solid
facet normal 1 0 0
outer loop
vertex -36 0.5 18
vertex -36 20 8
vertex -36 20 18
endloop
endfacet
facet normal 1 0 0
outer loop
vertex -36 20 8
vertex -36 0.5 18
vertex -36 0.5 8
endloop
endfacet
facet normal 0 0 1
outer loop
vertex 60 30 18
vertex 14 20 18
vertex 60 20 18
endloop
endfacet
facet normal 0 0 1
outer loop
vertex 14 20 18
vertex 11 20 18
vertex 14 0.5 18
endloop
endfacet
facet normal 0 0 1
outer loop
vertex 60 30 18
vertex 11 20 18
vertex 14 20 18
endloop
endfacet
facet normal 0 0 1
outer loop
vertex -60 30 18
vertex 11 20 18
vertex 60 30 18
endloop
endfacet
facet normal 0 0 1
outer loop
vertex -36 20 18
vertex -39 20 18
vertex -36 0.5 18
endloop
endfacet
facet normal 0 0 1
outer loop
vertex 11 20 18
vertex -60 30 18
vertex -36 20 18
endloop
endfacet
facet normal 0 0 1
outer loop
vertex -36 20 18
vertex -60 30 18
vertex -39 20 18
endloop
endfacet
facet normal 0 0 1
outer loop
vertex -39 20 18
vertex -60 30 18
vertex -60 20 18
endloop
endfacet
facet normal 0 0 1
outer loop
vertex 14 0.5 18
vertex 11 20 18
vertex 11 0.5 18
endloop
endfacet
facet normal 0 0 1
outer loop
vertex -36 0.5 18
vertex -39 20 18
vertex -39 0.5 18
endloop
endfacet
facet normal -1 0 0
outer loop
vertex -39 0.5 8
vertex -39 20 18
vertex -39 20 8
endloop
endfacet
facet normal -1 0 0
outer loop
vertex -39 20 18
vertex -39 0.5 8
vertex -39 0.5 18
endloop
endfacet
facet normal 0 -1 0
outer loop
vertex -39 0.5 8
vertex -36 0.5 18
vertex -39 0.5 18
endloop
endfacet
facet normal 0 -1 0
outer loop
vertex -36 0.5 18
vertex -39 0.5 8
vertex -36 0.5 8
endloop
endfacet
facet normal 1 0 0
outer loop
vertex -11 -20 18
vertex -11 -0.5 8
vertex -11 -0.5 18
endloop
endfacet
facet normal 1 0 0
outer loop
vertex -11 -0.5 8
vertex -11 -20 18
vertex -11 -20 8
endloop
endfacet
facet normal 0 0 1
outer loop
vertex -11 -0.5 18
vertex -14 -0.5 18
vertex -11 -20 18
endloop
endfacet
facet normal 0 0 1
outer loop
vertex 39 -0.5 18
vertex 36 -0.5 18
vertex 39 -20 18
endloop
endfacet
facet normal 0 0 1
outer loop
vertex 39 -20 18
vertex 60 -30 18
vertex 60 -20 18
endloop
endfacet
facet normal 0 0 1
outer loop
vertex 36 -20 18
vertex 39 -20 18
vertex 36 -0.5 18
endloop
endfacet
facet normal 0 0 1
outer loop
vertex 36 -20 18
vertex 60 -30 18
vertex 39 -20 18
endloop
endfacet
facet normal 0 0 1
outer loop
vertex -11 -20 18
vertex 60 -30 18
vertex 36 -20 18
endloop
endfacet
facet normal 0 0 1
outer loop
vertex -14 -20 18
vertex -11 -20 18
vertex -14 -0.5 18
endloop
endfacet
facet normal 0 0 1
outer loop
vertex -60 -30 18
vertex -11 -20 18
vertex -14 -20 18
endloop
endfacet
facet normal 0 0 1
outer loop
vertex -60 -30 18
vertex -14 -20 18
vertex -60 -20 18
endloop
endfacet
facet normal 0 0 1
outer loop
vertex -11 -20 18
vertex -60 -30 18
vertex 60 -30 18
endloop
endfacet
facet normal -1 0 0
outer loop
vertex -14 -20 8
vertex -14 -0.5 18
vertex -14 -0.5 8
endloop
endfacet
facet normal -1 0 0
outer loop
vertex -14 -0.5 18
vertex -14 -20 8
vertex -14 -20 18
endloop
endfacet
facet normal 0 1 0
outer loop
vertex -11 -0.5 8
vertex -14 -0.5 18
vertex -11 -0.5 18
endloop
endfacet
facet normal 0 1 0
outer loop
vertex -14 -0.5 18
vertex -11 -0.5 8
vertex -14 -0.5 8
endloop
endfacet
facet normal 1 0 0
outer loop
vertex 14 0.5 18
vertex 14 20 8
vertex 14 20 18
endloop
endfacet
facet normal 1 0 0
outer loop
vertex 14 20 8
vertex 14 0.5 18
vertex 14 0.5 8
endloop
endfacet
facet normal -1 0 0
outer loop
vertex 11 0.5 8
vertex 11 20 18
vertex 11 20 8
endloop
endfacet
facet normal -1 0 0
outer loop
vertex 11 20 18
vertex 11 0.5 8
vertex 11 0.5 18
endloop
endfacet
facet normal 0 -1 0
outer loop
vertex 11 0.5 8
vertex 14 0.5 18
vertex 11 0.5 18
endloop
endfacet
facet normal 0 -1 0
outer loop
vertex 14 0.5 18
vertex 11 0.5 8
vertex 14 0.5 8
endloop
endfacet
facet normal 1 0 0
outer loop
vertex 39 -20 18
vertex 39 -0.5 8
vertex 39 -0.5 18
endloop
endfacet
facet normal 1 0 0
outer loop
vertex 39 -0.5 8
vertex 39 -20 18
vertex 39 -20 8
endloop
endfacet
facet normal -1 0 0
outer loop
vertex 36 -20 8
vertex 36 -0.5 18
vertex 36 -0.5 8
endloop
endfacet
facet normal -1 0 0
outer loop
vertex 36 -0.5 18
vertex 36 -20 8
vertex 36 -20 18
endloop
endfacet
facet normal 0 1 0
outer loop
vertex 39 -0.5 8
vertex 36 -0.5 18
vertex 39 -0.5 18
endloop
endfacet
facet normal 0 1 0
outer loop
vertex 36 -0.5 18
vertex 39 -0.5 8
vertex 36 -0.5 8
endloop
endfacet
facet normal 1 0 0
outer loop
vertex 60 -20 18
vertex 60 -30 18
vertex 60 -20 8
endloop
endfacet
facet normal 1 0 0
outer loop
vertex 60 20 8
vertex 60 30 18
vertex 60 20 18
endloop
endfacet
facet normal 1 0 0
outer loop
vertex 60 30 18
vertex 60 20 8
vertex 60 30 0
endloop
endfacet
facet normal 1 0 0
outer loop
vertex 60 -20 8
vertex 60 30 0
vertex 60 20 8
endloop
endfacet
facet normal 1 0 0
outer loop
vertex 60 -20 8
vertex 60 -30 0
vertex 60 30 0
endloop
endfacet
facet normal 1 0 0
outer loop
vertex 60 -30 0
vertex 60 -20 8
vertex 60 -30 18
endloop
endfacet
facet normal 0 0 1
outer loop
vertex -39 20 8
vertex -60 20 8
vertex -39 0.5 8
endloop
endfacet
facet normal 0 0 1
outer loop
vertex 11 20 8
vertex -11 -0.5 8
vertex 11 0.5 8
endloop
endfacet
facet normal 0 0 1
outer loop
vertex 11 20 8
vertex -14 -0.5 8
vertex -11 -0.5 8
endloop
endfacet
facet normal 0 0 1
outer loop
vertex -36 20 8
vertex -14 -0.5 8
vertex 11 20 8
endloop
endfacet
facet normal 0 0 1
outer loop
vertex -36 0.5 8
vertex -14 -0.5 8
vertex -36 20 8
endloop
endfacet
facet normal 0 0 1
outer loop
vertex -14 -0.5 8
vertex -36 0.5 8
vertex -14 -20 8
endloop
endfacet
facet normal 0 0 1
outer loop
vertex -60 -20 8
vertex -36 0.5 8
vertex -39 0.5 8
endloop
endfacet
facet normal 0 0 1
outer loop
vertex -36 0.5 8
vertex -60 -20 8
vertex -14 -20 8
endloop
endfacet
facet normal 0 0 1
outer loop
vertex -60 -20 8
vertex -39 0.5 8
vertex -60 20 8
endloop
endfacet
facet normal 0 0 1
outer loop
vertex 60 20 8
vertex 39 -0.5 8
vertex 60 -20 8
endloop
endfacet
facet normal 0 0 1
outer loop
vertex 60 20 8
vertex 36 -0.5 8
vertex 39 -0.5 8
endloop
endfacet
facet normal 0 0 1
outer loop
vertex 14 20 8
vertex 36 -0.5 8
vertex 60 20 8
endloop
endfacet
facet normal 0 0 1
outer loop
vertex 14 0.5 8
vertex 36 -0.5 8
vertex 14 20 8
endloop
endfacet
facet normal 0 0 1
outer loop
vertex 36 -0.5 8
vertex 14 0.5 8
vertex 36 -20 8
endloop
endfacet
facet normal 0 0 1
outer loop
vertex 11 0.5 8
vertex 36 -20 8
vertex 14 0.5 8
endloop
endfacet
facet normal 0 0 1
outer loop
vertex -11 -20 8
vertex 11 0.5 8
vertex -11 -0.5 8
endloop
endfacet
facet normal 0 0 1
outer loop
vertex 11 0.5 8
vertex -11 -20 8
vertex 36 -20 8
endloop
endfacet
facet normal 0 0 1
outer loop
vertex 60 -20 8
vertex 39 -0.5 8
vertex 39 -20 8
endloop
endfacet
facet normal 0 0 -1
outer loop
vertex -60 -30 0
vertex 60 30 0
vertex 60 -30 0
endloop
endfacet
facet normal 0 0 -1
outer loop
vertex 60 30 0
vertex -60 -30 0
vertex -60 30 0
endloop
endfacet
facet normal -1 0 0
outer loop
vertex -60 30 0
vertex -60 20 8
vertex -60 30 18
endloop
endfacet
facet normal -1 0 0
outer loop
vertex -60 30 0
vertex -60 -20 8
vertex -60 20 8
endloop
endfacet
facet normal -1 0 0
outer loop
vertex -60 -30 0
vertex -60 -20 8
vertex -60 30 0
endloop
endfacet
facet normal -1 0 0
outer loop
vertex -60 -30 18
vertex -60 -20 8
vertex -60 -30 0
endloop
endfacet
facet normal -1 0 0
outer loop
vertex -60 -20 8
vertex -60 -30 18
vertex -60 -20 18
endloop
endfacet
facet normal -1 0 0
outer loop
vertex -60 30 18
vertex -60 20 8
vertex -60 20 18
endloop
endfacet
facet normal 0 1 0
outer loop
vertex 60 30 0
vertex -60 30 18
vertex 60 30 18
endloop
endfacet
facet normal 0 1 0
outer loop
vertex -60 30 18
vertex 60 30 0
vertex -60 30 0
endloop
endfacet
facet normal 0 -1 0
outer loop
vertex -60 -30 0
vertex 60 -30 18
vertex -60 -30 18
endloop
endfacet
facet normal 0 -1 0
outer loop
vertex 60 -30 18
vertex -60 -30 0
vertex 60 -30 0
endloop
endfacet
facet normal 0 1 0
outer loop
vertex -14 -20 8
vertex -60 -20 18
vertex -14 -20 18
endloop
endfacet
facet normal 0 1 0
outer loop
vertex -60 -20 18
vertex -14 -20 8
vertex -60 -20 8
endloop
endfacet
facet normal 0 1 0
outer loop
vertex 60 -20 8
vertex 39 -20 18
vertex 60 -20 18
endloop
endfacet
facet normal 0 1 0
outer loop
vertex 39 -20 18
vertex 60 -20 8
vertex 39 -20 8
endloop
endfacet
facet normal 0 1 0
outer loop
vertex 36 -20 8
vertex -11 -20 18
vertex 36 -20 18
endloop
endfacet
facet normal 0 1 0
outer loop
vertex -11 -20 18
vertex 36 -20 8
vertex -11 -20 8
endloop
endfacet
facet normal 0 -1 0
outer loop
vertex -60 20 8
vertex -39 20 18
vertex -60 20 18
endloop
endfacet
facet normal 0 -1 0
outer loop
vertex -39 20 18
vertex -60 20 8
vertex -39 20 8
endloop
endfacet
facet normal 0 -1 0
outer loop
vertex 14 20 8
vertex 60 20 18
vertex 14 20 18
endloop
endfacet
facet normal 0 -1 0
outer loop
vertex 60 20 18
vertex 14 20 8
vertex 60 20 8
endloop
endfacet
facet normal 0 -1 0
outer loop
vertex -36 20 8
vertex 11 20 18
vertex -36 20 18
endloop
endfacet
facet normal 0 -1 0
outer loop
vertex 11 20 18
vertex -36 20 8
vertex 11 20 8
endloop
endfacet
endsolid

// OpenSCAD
$fn = 32;

// ----------------------------------------------------------------------
// Rib frame 120 x 60 x 18
// 4 ribs at 25 mm pitch, staggered
// ----------------------------------------------------------------------

// --- parameters (mm) ---
frame = [120, 60, 8];  // base plate size (x, y, z)
rail_w = 10;           // side rail width
ribs = 4;              // number of ribs
rib_t = 3;             // rib thickness
rib_h = 10;            // rib height above the base plate
pitch = 25;            // pitch between rib centres

// --- derived feature positions (mm) ---
span = (ribs - 1) * pitch;          // = 75   distance between the outer ribs
origin_x = -span / 2;               // = -37.5   X of the first rib
rib_len = frame[1] / 2 - rail_w + 0.5;  // = 20.5   length of a staggered rib
rib_y = 0.5 + rib_len / 2;          // = 10.75   Y of a staggered rib centre
row_offset = 2 * rib_y;             // = 21.5   distance between the two rows
feature_centers = [
  [origin_x + 0 * pitch, rib_y],
  [origin_x + 1 * pitch, -rib_y],
  [origin_x + 2 * pitch, rib_y],
  [origin_x + 3 * pitch, -rib_y]
];   // rib centre line, drives the rib loop

// base plate, two side rails, then the ribs read straight off feature_centers
union() {
  translate([-frame[0] / 2, -frame[1] / 2, 0]) cube(frame);
  translate([-frame[0] / 2, -frame[1] / 2, 0]) cube([frame[0], rail_w, frame[2] + rib_h]);
  translate([-frame[0] / 2, frame[1] / 2 - rail_w, 0]) cube([frame[0], rail_w, frame[2] + rib_h]);
  for (centre = feature_centers)
    translate([centre[0] - rib_t / 2, centre[1] - rib_len / 2, frame[2] - 1])
      cube([rib_t, rib_len, rib_h + 1]);
}
